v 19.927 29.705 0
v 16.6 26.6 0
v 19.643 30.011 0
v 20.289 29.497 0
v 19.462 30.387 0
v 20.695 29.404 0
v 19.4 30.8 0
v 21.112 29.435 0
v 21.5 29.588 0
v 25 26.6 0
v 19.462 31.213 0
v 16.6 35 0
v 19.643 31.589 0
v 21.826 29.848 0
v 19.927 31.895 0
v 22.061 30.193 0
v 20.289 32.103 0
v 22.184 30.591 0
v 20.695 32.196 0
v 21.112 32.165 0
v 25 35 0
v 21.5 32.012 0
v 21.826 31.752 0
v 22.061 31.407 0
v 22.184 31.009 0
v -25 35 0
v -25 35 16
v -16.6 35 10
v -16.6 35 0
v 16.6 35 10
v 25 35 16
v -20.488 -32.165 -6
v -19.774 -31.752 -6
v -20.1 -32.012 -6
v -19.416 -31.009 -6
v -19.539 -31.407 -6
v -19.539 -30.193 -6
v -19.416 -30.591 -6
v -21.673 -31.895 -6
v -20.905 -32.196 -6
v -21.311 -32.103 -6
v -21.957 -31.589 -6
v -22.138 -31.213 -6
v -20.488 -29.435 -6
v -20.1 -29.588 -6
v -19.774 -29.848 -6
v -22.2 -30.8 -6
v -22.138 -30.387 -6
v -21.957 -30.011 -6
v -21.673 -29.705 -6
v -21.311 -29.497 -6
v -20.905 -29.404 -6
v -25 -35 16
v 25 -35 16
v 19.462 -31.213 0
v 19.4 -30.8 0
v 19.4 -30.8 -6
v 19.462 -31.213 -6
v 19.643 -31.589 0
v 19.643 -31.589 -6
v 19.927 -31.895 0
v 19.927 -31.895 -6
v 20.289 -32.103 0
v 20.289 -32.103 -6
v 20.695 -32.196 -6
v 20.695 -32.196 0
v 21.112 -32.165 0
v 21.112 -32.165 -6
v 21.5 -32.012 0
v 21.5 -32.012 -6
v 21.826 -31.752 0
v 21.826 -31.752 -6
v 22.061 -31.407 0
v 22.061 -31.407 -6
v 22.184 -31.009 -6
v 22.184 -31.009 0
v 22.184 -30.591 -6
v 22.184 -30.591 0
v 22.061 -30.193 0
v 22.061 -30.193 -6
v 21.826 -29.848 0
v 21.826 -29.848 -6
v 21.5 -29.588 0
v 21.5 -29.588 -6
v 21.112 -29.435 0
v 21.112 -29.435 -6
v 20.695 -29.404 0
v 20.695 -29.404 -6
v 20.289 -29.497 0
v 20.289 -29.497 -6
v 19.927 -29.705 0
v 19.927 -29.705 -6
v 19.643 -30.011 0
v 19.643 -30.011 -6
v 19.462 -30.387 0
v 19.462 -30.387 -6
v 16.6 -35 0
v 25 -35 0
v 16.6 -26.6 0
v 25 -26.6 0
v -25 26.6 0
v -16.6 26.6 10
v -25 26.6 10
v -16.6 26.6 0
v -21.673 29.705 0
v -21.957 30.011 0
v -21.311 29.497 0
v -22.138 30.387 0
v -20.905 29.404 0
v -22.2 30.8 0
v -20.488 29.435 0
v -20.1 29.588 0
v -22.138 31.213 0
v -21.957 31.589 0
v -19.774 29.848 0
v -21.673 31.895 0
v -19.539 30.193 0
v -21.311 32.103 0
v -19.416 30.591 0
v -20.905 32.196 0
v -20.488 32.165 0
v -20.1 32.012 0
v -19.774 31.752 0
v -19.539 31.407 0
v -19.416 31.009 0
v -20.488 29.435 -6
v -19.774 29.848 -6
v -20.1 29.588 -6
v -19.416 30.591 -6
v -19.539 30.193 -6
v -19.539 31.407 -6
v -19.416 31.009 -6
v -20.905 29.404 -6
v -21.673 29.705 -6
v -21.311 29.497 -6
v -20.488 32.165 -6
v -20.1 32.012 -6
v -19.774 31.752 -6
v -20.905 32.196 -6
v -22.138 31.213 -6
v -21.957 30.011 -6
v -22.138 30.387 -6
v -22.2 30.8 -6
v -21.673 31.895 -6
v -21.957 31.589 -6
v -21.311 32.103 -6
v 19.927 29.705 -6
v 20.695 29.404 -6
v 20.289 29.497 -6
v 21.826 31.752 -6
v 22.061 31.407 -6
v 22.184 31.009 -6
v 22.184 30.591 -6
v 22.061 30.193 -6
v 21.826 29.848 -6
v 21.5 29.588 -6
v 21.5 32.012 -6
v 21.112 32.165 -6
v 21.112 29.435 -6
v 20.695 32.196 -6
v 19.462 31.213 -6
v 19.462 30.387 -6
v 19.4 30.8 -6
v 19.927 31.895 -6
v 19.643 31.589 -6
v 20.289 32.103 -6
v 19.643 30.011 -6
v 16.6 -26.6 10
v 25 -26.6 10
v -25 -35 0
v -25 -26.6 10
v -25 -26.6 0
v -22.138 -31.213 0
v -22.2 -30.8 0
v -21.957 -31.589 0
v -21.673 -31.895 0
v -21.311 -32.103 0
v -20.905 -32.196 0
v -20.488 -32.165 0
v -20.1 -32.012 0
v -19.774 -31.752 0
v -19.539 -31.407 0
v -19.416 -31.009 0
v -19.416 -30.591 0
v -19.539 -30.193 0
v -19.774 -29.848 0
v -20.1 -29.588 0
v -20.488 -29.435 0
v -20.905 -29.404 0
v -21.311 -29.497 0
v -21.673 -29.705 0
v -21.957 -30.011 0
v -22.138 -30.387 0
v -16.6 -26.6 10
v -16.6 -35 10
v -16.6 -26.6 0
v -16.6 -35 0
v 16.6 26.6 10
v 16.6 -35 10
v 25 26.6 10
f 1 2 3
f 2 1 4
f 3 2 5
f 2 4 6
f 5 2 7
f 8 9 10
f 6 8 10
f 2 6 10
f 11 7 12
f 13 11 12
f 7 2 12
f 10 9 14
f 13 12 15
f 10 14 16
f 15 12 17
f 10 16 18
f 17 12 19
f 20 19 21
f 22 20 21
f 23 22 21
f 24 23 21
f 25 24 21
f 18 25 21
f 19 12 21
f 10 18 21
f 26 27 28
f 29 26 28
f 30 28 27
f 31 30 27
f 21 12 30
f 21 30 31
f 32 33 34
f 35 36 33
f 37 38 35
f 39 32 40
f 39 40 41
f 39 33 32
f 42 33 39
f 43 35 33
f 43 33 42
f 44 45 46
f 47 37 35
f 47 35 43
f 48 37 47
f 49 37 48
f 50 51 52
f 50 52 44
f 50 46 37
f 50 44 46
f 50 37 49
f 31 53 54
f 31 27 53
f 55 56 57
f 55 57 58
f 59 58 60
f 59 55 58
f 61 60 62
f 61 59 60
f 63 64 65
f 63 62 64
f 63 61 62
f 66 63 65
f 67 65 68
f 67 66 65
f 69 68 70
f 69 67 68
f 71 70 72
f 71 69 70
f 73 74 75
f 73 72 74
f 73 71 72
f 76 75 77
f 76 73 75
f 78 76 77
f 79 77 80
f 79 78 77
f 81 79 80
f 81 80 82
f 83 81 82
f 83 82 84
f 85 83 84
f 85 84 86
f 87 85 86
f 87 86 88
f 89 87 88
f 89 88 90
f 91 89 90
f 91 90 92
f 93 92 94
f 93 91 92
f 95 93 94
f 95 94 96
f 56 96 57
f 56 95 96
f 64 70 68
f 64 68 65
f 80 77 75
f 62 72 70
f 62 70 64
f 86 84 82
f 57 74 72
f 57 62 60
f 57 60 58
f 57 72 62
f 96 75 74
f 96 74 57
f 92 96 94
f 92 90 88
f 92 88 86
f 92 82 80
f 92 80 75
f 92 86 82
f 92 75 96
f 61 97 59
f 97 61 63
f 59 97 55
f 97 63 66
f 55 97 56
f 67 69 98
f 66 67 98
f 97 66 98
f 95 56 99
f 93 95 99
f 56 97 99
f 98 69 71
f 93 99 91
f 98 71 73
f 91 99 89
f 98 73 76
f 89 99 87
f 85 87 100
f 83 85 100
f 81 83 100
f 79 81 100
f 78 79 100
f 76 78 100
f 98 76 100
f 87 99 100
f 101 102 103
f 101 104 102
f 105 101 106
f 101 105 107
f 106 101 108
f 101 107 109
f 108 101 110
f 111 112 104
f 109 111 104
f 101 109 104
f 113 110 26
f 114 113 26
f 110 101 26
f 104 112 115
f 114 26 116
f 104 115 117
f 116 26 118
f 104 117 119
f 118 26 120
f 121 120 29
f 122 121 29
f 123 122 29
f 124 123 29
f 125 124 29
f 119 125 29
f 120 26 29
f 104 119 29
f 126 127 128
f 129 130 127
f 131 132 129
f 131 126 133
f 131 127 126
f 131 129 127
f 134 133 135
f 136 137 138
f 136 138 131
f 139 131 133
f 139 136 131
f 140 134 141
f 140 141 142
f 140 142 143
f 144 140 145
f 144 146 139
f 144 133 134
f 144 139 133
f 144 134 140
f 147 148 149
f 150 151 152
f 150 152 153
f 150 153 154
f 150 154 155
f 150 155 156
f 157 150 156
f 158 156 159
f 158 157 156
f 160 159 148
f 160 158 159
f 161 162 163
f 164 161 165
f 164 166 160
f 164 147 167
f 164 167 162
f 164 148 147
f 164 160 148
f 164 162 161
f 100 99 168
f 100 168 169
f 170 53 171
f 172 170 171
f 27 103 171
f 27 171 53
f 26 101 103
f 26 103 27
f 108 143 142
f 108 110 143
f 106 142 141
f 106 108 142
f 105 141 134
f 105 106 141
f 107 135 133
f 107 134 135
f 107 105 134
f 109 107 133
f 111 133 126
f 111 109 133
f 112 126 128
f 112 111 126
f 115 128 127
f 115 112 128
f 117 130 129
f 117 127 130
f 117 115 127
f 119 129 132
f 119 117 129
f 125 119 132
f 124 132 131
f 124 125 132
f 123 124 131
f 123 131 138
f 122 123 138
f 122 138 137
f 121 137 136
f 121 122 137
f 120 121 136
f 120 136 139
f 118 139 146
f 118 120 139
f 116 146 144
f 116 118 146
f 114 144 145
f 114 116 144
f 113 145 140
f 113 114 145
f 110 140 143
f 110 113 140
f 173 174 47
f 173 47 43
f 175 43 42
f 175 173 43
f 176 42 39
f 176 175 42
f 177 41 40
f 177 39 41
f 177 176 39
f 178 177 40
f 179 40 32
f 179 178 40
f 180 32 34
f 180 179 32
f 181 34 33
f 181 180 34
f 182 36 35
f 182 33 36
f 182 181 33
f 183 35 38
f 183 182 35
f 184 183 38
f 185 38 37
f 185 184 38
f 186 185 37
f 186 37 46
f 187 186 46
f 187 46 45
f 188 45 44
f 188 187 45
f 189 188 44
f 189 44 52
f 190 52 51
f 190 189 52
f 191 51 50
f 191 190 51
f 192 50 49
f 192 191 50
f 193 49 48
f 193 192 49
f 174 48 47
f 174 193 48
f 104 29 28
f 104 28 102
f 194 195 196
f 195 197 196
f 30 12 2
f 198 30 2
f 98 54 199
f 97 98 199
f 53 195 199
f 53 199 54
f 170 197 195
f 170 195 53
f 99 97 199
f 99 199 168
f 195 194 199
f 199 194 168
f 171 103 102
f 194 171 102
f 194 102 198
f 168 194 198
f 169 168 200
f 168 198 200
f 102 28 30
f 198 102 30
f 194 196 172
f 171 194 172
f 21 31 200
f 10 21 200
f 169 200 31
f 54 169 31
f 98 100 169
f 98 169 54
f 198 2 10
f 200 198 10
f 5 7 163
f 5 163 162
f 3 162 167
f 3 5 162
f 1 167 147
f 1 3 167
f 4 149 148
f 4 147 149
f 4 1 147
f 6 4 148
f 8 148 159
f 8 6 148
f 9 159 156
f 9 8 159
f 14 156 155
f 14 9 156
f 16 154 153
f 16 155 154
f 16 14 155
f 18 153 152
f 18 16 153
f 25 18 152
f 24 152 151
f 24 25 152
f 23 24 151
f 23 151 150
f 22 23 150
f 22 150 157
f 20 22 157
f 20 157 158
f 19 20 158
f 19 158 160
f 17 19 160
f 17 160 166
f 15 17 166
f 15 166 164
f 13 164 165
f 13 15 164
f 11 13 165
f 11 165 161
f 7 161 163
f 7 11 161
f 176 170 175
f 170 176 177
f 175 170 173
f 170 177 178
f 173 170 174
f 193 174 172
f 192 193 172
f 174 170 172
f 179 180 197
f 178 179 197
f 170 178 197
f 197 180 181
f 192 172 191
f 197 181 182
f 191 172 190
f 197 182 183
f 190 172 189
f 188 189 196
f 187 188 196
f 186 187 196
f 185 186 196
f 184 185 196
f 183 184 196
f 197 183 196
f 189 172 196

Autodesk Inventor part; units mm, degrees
ref_plane "YZ Plane" through (0, 0, 0) normal (1, 0, 0) x (0, 1, 0)
ref_plane "XZ Plane" through (0, 0, 0) normal (0, 1, 0) x (-1, 0, 0)
ref_plane "XY Plane" through (0, 0, 0) normal (0, 0, 1) x (1, 0, 0)
sketch "스케치1" plane through (0, 0, 0) normal (0, 0, 1) x (1, 0, 0)
  circle A0 centre (20.8, -30.8) radius 1.6 projected
  circle A1 centre (20.8, 30.8) radius 1.6 projected
  circle A2 centre (-20.8, -30.8) radius 1.6 projected
  circle A3 centre (-20.8, 30.8) radius 1.6 projected
  line L0 (25, 35) -> (25, -35) projected
  line L1 (-25, 35) -> (25, 35) projected
  line L2 (-25, -35) -> (-25, 35) projected
  line L3 (25, -35) -> (-25, -35) projected
  line L4 (3.4609, -14.6309) -> (3.4609, -15.4416) projected
  line L5 (3.4609, -15.4416) -> (-1.9174, -15.4416) projected
  line L6 (-1.9174, -15.4416) -> (-1.9174, -17.4882) projected
  line L7 (-1.9174, -17.4882) -> (-2.6391, -17.4882) projected
  line L8 (-2.6391, -17.4882) -> (-2.6391, -12.5844) projected
  line L9 (-2.6391, -12.5844) -> (-1.9174, -12.5844) projected
  line L10 (-1.9174, -12.5844) -> (-1.9174, -14.6309) projected
  line L11 (-1.9174, -14.6309) -> (3.4609, -14.6309) projected
  spline S0 degree 3 poles (3.5894, -6.7069) (3.5894, -7.2061) (3.5079, -7.4974) (3.4054, -7.7829) (3.3472, -7.9038) (3.2038, -8.1322) (3.1203, -8.2371) (3.0259, -8.3332) knots 0 0 0 0 0.149781 0.149781 0.269685 0.269685 0.389491 0.389491 0.389491 0.389491 projected
  spline S1 degree 3 poles (3.0259, -8.3332) (2.8735, -8.4928) (2.696, -8.6163) (2.4131, -8.7398) (2.2257, -8.8143) (1.6618, -8.9024) (1.4109, -8.9165) (1.1672, -8.9165) knots 0 0 0 0 0.066182 0.066182 0.092608 0.092608 0.112316 0.112316 0.112316 0.112316 projected
  line L12 (1.1672, -8.9165) -> (-2.6391, -8.9165) projected
  line L13 (-2.6391, -8.9165) -> (-2.6391, -8.1058) projected
  line L14 (-2.6391, -8.1058) -> (1.187, -8.1058) projected
  spline S2 degree 3 poles (1.187, -8.1058) (1.576, -8.1058) (1.7854, -8.0698) (2.0673, -8.0159) (2.2402, -7.948) (2.3981, -7.8438) knots 0 0 0 0 0.116713 0.116713 0.342312 0.342312 0.342312 0.342312 projected
  spline S3 degree 3 poles (2.3981, -7.8438) (2.5057, -7.7728) (2.5951, -7.6834) (2.7648, -7.4325) (2.8129, -7.284) (2.8802, -7.0309) (2.8973, -6.8687) (2.8973, -6.7069) knots 0 0 0 0 0.038677 0.038677 0.09087 0.09087 0.175293 0.175293 0.175293 0.175293 projected
  spline S4 degree 3 poles (2.8973, -6.7069) (2.8973, -6.4866) (2.8694, -6.2573) (2.7554, -5.9796) (2.7065, -5.8804) (2.5606, -5.7003) (2.4845, -5.6319) (2.3981, -5.5749) knots 0 0 0 0 0.066079 0.066079 0.089916 0.089916 0.109159 0.109159 0.109159 0.109159 projected
  spline S5 degree 3 poles (2.3981, -5.5749) (2.2456, -5.4743) (2.0787, -5.4078) (1.787, -5.3484) (1.5677, -5.3129) (1.1672, -5.3129) knots 0 0 0 0 0.054791 0.054791 0.089305 0.089305 0.089305 0.089305 projected
  line L15 (1.1672, -5.3129) -> (-2.6391, -5.3129) projected
  line L16 (-2.6391, -5.3129) -> (-2.6391, -4.5022) projected
  line L17 (-2.6391, -4.5022) -> (1.1672, -4.5022) projected
  spline S6 degree 3 poles (1.1672, -4.5022) (1.7467, -4.5022) (2.0771, -4.578) (2.4094, -4.6758) (2.5476, -4.7346) (2.8054, -4.8878) (2.9214, -4.9794) (3.0259, -5.0855) knots 0 0 0 0 0.173857 0.173857 0.308173 0.308173 0.440658 0.440658 0.440658 0.440658 projected
  spline S7 degree 3 poles (3.0259, -5.0855) (3.188, -5.2476) (3.3119, -5.4359) (3.468, -5.8026) (3.513, -5.9645) (3.576, -6.3201) (3.5894, -6.5148) (3.5894, -6.7069) knots 0 0 0 0 0.068773 0.068773 0.119566 0.119566 0.177287 0.177287 0.177287 0.177287 projected
  line L18 (3.4609, 6.6696) -> (2.838, 6.6696) projected
  line L19 (2.838, 6.6696) -> (2.838, 7.4457) projected
  line L20 (2.838, 7.4457) -> (-2.0163, 7.4457) projected
  line L21 (-2.0163, 7.4457) -> (-2.0163, 6.6696) projected
  line L22 (-2.0163, 6.6696) -> (-2.6391, 6.6696) projected
  line L23 (-2.6391, 6.6696) -> (-2.6391, 9.0325) projected
  line L24 (-2.6391, 9.0325) -> (-2.0163, 9.0325) projected
  line L25 (-2.0163, 9.0325) -> (-2.0163, 8.2564) projected
  line L26 (-2.0163, 8.2564) -> (2.838, 8.2564) projected
  line L27 (2.838, 8.2564) -> (2.838, 9.0325) projected
  line L28 (2.838, 9.0325) -> (3.4609, 9.0325) projected
  line L29 (3.4609, 9.0325) -> (3.4609, 6.6696) projected
  spline S8 degree 3 poles (3.5696, 11.4498) (3.5696, 11.0968) (3.5385, 10.9252) (3.4927, 10.6907) (3.4451, 10.5225) (3.3917, 10.3623) knots 0 0 0 0 0.105897 0.105897 0.361981 0.361981 0.361981 0.361981 projected
  spline S9 degree 3 poles (3.3917, 10.3623) (3.3122, 10.1089) (3.2476, 9.9765) (3.1649, 9.8065) (3.1044, 9.6784) (3.0456, 9.5516) knots 0 0 0 0 0.079656 0.079656 0.305782 0.305782 0.305782 0.305782 projected
  line L30 (3.0456, 9.5516) -> (2.0767, 9.5516) projected
  line L31 (2.0767, 9.5516) -> (2.0767, 9.6109) projected
  spline S10 degree 3 poles (2.0767, 9.6109) (2.1724, 9.7066) (2.276, 9.8355) (2.4013, 9.9909) (2.4887, 10.1245) (2.5661, 10.2584) knots 0 0 0 0 0.0406 0.0406 0.180817 0.180817 0.180817 0.180817 projected
  spline S11 degree 3 poles (2.5661, 10.2584) (2.6936, 10.4889) (2.7578, 10.7089) (2.8422, 11.001) (2.8677, 11.2201) (2.8677, 11.4399) knots 0 0 0 0 0.079015 0.079015 0.285121 0.285121 0.285121 0.285121 projected
  spline S12 degree 3 poles (2.8677, 11.4399) (2.8677, 11.6791) (2.8234, 11.9096) (2.6905, 12.2276) (2.6304, 12.347) (2.4562, 12.5833) (2.363, 12.6815) (2.2596, 12.7696) knots 0 0 0 0 0.071758 0.071758 0.103413 0.103413 0.130661 0.130661 0.130661 0.130661 projected
  spline S13 degree 3 poles (2.2596, 12.7696) (2.0598, 12.9378) (1.8287, 13.0612) (1.3654, 13.2321) (1.0093, 13.3332) (0.4158, 13.3332) knots 0 0 0 0 0.078349 0.078349 0.148171 0.148171 0.148171 0.148171 projected
  spline S14 degree 3 poles (0.4158, 13.3332) (-0.1058, 13.3332) (-0.4504, 13.2487) (-0.927, 13.104) (-1.2002, 12.9774) (-1.428, 12.7894) knots 0 0 0 0 0.156476 0.156476 0.384161 0.384161 0.384161 0.384161 projected
  spline S15 degree 3 poles (-1.428, 12.7894) (-1.6106, 12.6333) (-1.7595, 12.4499) (-1.9192, 12.1338) (-1.9723, 12.0047) (-2.0407, 11.7153) (-2.0558, 11.5784) (-2.0558, 11.4399) knots 0 0 0 0 0.072073 0.072073 0.106242 0.106242 0.13604 0.13604 0.13604 0.13604 projected
  spline S16 degree 3 poles (-2.0558, 11.4399) (-2.0558, 11.0983) (-1.9995, 10.8945) (-1.922, 10.6336) (-1.853, 10.4636) (-1.7642, 10.3029) knots 0 0 0 0 0.102473 0.102473 0.315019 0.315019 0.315019 0.315019 projected
  spline S17 degree 3 poles (-1.7642, 10.3029) (-1.6346, 10.0678) (-1.5778, 9.9965) (-1.419, 9.8036) (-1.3331, 9.7017) (-1.255, 9.6158) knots 0 0 0 0 0.080527 0.080527 0.149615 0.149615 0.149615 0.149615 projected
  line L32 (-1.255, 9.6158) -> (-1.255, 9.5516) projected
  line L33 (-1.255, 9.5516) -> (-2.2338, 9.5516) projected
  spline S18 degree 3 poles (-2.2338, 9.5516) (-2.3342, 9.7386) (-2.4001, 9.8833) (-2.4926, 10.0908) (-2.5452, 10.2254) (-2.5897, 10.3623) knots 0 0 0 0 0.063697 0.063697 0.17369 0.17369 0.17369 0.17369 projected
  spline S19 degree 3 poles (-2.5897, 10.3623) (-2.6578, 10.586) (-2.6908, 10.783) (-2.7347, 11.0489) (-2.7479, 11.2426) (-2.7479, 11.4349) knots 0 0 0 0 0.070178 0.070178 0.245229 0.245229 0.245229 0.245229 projected
  spline S20 degree 3 poles (-2.7479, 11.4349) (-2.7479, 11.8102) (-2.6884, 12.1794) (-2.4851, 12.6671) (-2.4001, 12.8345) (-2.1695, 13.1574) (-2.0458, 13.2939) (-1.9075, 13.4172) knots 0 0 0 0 0.112583 0.112583 0.158498 0.158498 0.198702 0.198702 0.198702 0.198702 projected
  spline S21 degree 3 poles (-1.9075, 13.4172) (-1.6331, 13.6594) (-1.3194, 13.8381) (-0.7236, 14.0548) (-0.2884, 14.1785) (0.4158, 14.1785) knots 0 0 0 0 0.109811 0.109811 0.190197 0.190197 0.190197 0.190197 projected
  spline S22 degree 3 poles (0.4158, 14.1785) (1.1016, 14.1785) (1.5387, 14.0598) (1.9684, 13.9147) (2.1514, 13.8354) (2.4841, 13.645) (2.6333, 13.5376) (2.7688, 13.4123) knots 0 0 0 0 0.205724 0.205724 0.366116 0.366116 0.515054 0.515054 0.515054 0.515054 projected
  spline S23 degree 3 poles (2.7688, 13.4123) (3.001, 13.2001) (3.1844, 12.9521) (3.4019, 12.4833) (3.465, 12.2871) (3.55, 11.8776) (3.5696, 11.6642) (3.5696, 11.4498) knots 0 0 0 0 0.094355 0.094355 0.155041 0.155041 0.218881 0.218881 0.218881 0.218881 projected
  line L34 (3.4609, 0.9453) -> (0.8063, 3.1154) projected
  spline S24 degree 3 poles (0.8063, 3.1154) (0.7091, 2.8546) (0.5712, 2.6157) (0.2499, 2.2703) (0.0734, 2.1207) (-0.2854, 1.9573) (-0.4142, 1.9172) (-0.6904, 1.8622) (-0.8369, 1.8499) (-0.9831, 1.8499) knots 0 0 0 0 0.083518 0.083518 0.141507 0.141507 0.171807 0.171807 0.204564 0.204564 0.204564 0.204564 projected
  spline S25 degree 3 poles (-0.9831, 1.8499) (-1.2, 1.8499) (-1.421, 1.8784) (-1.7689, 2.0145) (-1.898, 2.0959) (-2.134, 2.2962) (-2.234, 2.4122) (-2.3178, 2.542) knots 0 0 0 0 0.065064 0.065064 0.111971 0.111971 0.158744 0.158744 0.158744 0.158744 projected
  spline S26 degree 3 poles (-2.3178, 2.542) (-2.4457, 2.7399) (-2.5352, 2.9539) (-2.6309, 3.4845) (-2.6391, 3.7907) (-2.6391, 4.0942) knots 0 0 0 0 0.070674 0.070674 0.161725 0.161725 0.161725 0.161725 projected
  line L35 (-2.6391, 4.0942) -> (-2.6391, 5.6661) projected
  line L36 (-2.6391, 5.6661) -> (3.4609, 5.6661) projected
  line L37 (3.4609, 5.6661) -> (3.4609, 4.8554) projected
  line L38 (3.4609, 4.8554) -> (1.0337, 4.8554) projected
  line L39 (1.0337, 4.8554) -> (1.0337, 3.9261) projected
  line L40 (1.0337, 3.9261) -> (3.4609, 1.9982) projected
  line L41 (3.4609, 1.9982) -> (3.4609, 0.9453) projected
  spline S27 degree 3 poles (3.5696, -1.9218) (3.5696, -2.2748) (3.5385, -2.4464) (3.4927, -2.6809) (3.4451, -2.849) (3.3917, -3.0093) knots 0 0 0 0 0.105897 0.105897 0.361981 0.361981 0.361981 0.361981 projected
  spline S28 degree 3 poles (3.3917, -3.0093) (3.3122, -3.2627) (3.2476, -3.3951) (3.1649, -3.5651) (3.1044, -3.6932) (3.0456, -3.82) knots 0 0 0 0 0.079656 0.079656 0.305782 0.305782 0.305782 0.305782 projected
  line L42 (3.0456, -3.82) -> (2.0767, -3.82) projected
  line L43 (2.0767, -3.82) -> (2.0767, -3.7607) projected
  spline S29 degree 3 poles (2.0767, -3.7607) (2.1724, -3.665) (2.276, -3.5361) (2.4013, -3.3806) (2.4887, -3.2471) (2.5661, -3.1131) knots 0 0 0 0 0.0406 0.0406 0.180817 0.180817 0.180817 0.180817 projected
  spline S30 degree 3 poles (2.5661, -3.1131) (2.6936, -2.8826) (2.7578, -2.6627) (2.8422, -2.3706) (2.8677, -2.1514) (2.8677, -1.9317) knots 0 0 0 0 0.079015 0.079015 0.285121 0.285121 0.285121 0.285121 projected
  spline S31 degree 3 poles (2.8677, -1.9317) (2.8677, -1.6925) (2.8234, -1.462) (2.6905, -1.144) (2.6304, -1.0246) (2.4562, -0.7882) (2.363, -0.6901) (2.2596, -0.6019) knots 0 0 0 0 0.071758 0.071758 0.103413 0.103413 0.130661 0.130661 0.130661 0.130661 projected
  spline S32 degree 3 poles (2.2596, -0.6019) (2.0598, -0.4338) (1.8287, -0.3103) (1.3654, -0.1394) (1.0093, -0.0384) (0.4158, -0.0384) knots 0 0 0 0 0.078349 0.078349 0.148171 0.148171 0.148171 0.148171 projected
  spline S33 degree 3 poles (0.4158, -0.0384) (-0.1058, -0.0384) (-0.4504, -0.1228) (-0.927, -0.2675) (-1.2002, -0.3941) (-1.428, -0.5822) knots 0 0 0 0 0.156476 0.156476 0.384161 0.384161 0.384161 0.384161 projected
  spline S34 degree 3 poles (-1.428, -0.5822) (-1.6106, -0.7383) (-1.7595, -0.9217) (-1.9192, -1.2377) (-1.9723, -1.3669) (-2.0407, -1.6563) (-2.0558, -1.7931) (-2.0558, -1.9317) knots 0 0 0 0 0.072073 0.072073 0.106242 0.106242 0.13604 0.13604 0.13604 0.13604 projected
  spline S35 degree 3 poles (-2.0558, -1.9317) (-2.0558, -2.2732) (-1.9995, -2.4771) (-1.922, -2.7379) (-1.853, -2.908) (-1.7642, -3.0686) knots 0 0 0 0 0.102473 0.102473 0.315019 0.315019 0.315019 0.315019 projected
  spline S36 degree 3 poles (-1.7642, -3.0686) (-1.6346, -3.3037) (-1.5778, -3.3751) (-1.419, -3.568) (-1.3331, -3.6699) (-1.255, -3.7557) knots 0 0 0 0 0.080527 0.080527 0.149615 0.149615 0.149615 0.149615 projected
  line L44 (-1.255, -3.7557) -> (-1.255, -3.82) projected
  line L45 (-1.255, -3.82) -> (-2.2338, -3.82) projected
  spline S37 degree 3 poles (-2.2338, -3.82) (-2.3342, -3.6329) (-2.4001, -3.4883) (-2.4926, -3.2807) (-2.5452, -3.1462) (-2.5897, -3.0093) knots 0 0 0 0 0.063697 0.063697 0.17369 0.17369 0.17369 0.17369 projected
  spline S38 degree 3 poles (-2.5897, -3.0093) (-2.6578, -2.7855) (-2.6908, -2.5886) (-2.7347, -2.3227) (-2.7479, -2.129) (-2.7479, -1.9366) knots 0 0 0 0 0.070178 0.070178 0.245229 0.245229 0.245229 0.245229 projected
  spline S39 degree 3 poles (-2.7479, -1.9366) (-2.7479, -1.5613) (-2.6884, -1.1922) (-2.4851, -0.7045) (-2.4001, -0.5371) (-2.1695, -0.2142) (-2.0458, -0.0776) (-1.9075, 0.0456) knots 0 0 0 0 0.112583 0.112583 0.158498 0.158498 0.198702 0.198702 0.198702 0.198702 projected
  spline S40 degree 3 poles (-1.9075, 0.0456) (-1.6331, 0.2878) (-1.3194, 0.4666) (-0.7236, 0.6832) (-0.2884, 0.8069) (0.4158, 0.8069) knots 0 0 0 0 0.109811 0.109811 0.190197 0.190197 0.190197 0.190197 projected
  spline S41 degree 3 poles (0.4158, 0.8069) (1.1016, 0.8069) (1.5387, 0.6882) (1.9684, 0.5432) (2.1514, 0.4638) (2.4841, 0.2734) (2.6333, 0.166) (2.7688, 0.0407) knots 0 0 0 0 0.205724 0.205724 0.366116 0.366116 0.515054 0.515054 0.515054 0.515054 projected
  spline S42 degree 3 poles (2.7688, 0.0407) (3.001, -0.1714) (3.1844, -0.4194) (3.4019, -0.8882) (3.465, -1.0845) (3.55, -1.494) (3.5696, -1.7074) (3.5696, -1.9218) knots 0 0 0 0 0.094355 0.094355 0.155041 0.155041 0.218881 0.218881 0.218881 0.218881 projected
  line L46 (3.4609, -12.2038) -> (2.838, -12.2038) projected
  line L47 (2.838, -12.2038) -> (2.838, -11.4277) projected
  line L48 (2.838, -11.4277) -> (-2.0163, -11.4277) projected
  line L49 (-2.0163, -11.4277) -> (-2.0163, -12.2038) projected
  line L50 (-2.0163, -12.2038) -> (-2.6391, -12.2038) projected
  line L51 (-2.6391, -12.2038) -> (-2.6391, -9.8409) projected
  line L52 (-2.6391, -9.8409) -> (-2.0163, -9.8409) projected
  line L53 (-2.0163, -9.8409) -> (-2.0163, -10.617) projected
  line L54 (-2.0163, -10.617) -> (2.838, -10.617) projected
  line L55 (2.838, -10.617) -> (2.838, -9.8409) projected
  line L56 (2.838, -9.8409) -> (3.4609, -9.8409) projected
  line L57 (3.4609, -9.8409) -> (3.4609, -12.2038) projected
  line L58 (-25, -35) -> (25, -35)
  line L59 (25, -35) -> (25, 35)
  line L60 (25, 35) -> (-25, 35)
  line L61 (-25, 35) -> (-25, -35)
  circle A4 centre (-20.8, 30.8) radius 4.2
  circle A5 centre (-20.8, -30.8) radius 4.2
  circle A6 centre (20.8, -30.8) radius 4.2
  circle A7 centre (20.8, 30.8) radius 4.2
  line L62 (-16.6, 26.6) -> (-25, 26.6)
  line L63 (-25, 26.6) -> (-25, 35)
  line L64 (-25, 35) -> (-16.6, 35)
  line L65 (-16.6, 35) -> (-16.6, 26.6)
  line L66 (-16.6, -26.6) -> (-25, -26.6)
  line L67 (-25, -26.6) -> (-25, -35)
  line L68 (-25, -35) -> (-16.6, -35)
  line L69 (-16.6, -35) -> (-16.6, -26.6)
  line L70 (16.6, -26.6) -> (25, -26.6)
  line L71 (25, -26.6) -> (25, -35)
  line L72 (25, -35) -> (16.6, -35)
  line L73 (16.6, -35) -> (16.6, -26.6)
  line L74 (16.6, 26.6) -> (25, 26.6)
  line L75 (25, 26.6) -> (25, 35)
  line L76 (25, 35) -> (16.6, 35)
  line L77 (16.6, 35) -> (16.6, 26.6)
  point P0 (0, 0)
  point P1 (-16.6, -30.8)
  point P2 (-20.8, -35)
  point P3 (-20.8, -26.6)
  point P4 (-25, -30.8)
  point P5 (16.6, -30.8)
  point P6 (20.8, -35)
  point P7 (20.8, -26.6)
  point P8 (25, -30.8)
  point P9 (-16.6, 30.8)
  point P10 (-20.8, 35)
  point P11 (-20.8, 26.6)
  point P12 (-25, 30.8)
  point P13 (16.6, 30.8)
  point P14 (20.8, 35)
  point P15 (20.8, 26.6)
  point P16 (25, 30.8)
extrude "돌출1" add sketch "스케치1" along normal blind 10 contours A0 | A1 | A2 | A3 | L0 A7 L1 | A7 | L0 L74 A7 | A7 L77 L1 | L74 L77 A7 | L0 A6 L70 | L65 A4 L1 | A6 | L0 L3 A6 | A6 L73 L70 | A4 L2 L1 | A4 | L65 L62 A4 | L3 L73 A6 | A4 L62 L2 | L3 A5 L69 | L66 A5 L2 | L3 L2 A5 | A5 | A5 L66 L69
sketch "스케치2" plane through (-20.8, -30.8, 10) normal (0, 0, 1) x (1, 0, 0)
  circle A0 centre (41.6, 0) radius 1.6 projected
  circle A1 centre (41.6, 61.6) radius 1.6 projected
  circle A2 centre (0, 0) radius 1.6 projected
  circle A3 centre (0, 61.6) radius 1.6 projected
  line L0 (45.8, 65.8) -> (45.8, -4.2) projected
  line L1 (-4.2, 65.8) -> (45.8, 65.8) projected
  line L2 (-4.2, -4.2) -> (-4.2, 65.8) projected
  line L3 (45.8, -4.2) -> (-4.2, -4.2) projected
  line L4 (24.2609, 16.1691) -> (24.2609, 15.3584) projected
  line L5 (24.2609, 15.3584) -> (18.8826, 15.3584) projected
  line L6 (18.8826, 15.3584) -> (18.8826, 13.3118) projected
  line L7 (18.8826, 13.3118) -> (18.1609, 13.3118) projected
  line L8 (18.1609, 13.3118) -> (18.1609, 18.2156) projected
  line L9 (18.1609, 18.2156) -> (18.8826, 18.2156) projected
  line L10 (18.8826, 18.2156) -> (18.8826, 16.1691) projected
  line L11 (18.8826, 16.1691) -> (24.2609, 16.1691) projected
  spline S0 degree 3 poles (24.3894, 24.0931) (24.3894, 23.5939) (24.3079, 23.3026) (24.2054, 23.0171) (24.1472, 22.8962) (24.0038, 22.6678) (23.9203, 22.5629) (23.8259, 22.4668) knots 0 0 0 0 0.149781 0.149781 0.269685 0.269685 0.389491 0.389491 0.389491 0.389491 projected
  spline S1 degree 3 poles (23.8259, 22.4668) (23.6735, 22.3072) (23.496, 22.1837) (23.2131, 22.0602) (23.0257, 21.9857) (22.4618, 21.8976) (22.2109, 21.8835) (21.9672, 21.8835) knots 0 0 0 0 0.066182 0.066182 0.092608 0.092608 0.112316 0.112316 0.112316 0.112316 projected
  line L12 (21.9672, 21.8835) -> (18.1609, 21.8835) projected
  line L13 (18.1609, 21.8835) -> (18.1609, 22.6942) projected
  line L14 (18.1609, 22.6942) -> (21.987, 22.6942) projected
  spline S2 degree 3 poles (21.987, 22.6942) (22.376, 22.6942) (22.5854, 22.7302) (22.8673, 22.7841) (23.0402, 22.852) (23.1981, 22.9562) knots 0 0 0 0 0.116713 0.116713 0.342312 0.342312 0.342312 0.342312 projected
  spline S3 degree 3 poles (23.1981, 22.9562) (23.3057, 23.0272) (23.3951, 23.1166) (23.5648, 23.3675) (23.6129, 23.516) (23.6802, 23.7691) (23.6973, 23.9313) (23.6973, 24.0931) knots 0 0 0 0 0.038677 0.038677 0.09087 0.09087 0.175293 0.175293 0.175293 0.175293 projected
  spline S4 degree 3 poles (23.6973, 24.0931) (23.6973, 24.3134) (23.6694, 24.5427) (23.5554, 24.8204) (23.5065, 24.9196) (23.3606, 25.0997) (23.2845, 25.1681) (23.1981, 25.2251) knots 0 0 0 0 0.066079 0.066079 0.089916 0.089916 0.109159 0.109159 0.109159 0.109159 projected
  spline S5 degree 3 poles (23.1981, 25.2251) (23.0456, 25.3257) (22.8787, 25.3922) (22.587, 25.4516) (22.3677, 25.4871) (21.9672, 25.4871) knots 0 0 0 0 0.054791 0.054791 0.089305 0.089305 0.089305 0.089305 projected
  line L15 (21.9672, 25.4871) -> (18.1609, 25.4871) projected
  line L16 (18.1609, 25.4871) -> (18.1609, 26.2978) projected
  line L17 (18.1609, 26.2978) -> (21.9672, 26.2978) projected
  spline S6 degree 3 poles (21.9672, 26.2978) (22.5467, 26.2978) (22.8771, 26.222) (23.2094, 26.1242) (23.3476, 26.0654) (23.6054, 25.9122) (23.7214, 25.8206) (23.8259, 25.7145) knots 0 0 0 0 0.173857 0.173857 0.308173 0.308173 0.440658 0.440658 0.440658 0.440658 projected
  spline S7 degree 3 poles (23.8259, 25.7145) (23.988, 25.5524) (24.1119, 25.3641) (24.268, 24.9974) (24.313, 24.8355) (24.376, 24.4799) (24.3894, 24.2852) (24.3894, 24.0931) knots 0 0 0 0 0.068773 0.068773 0.119566 0.119566 0.177287 0.177287 0.177287 0.177287 projected
  line L18 (24.2609, 37.4696) -> (23.638, 37.4696) projected
  line L19 (23.638, 37.4696) -> (23.638, 38.2457) projected
  line L20 (23.638, 38.2457) -> (18.7837, 38.2457) projected
  line L21 (18.7837, 38.2457) -> (18.7837, 37.4696) projected
  line L22 (18.7837, 37.4696) -> (18.1609, 37.4696) projected
  line L23 (18.1609, 37.4696) -> (18.1609, 39.8325) projected
  line L24 (18.1609, 39.8325) -> (18.7837, 39.8325) projected
  line L25 (18.7837, 39.8325) -> (18.7837, 39.0564) projected
  line L26 (18.7837, 39.0564) -> (23.638, 39.0564) projected
  line L27 (23.638, 39.0564) -> (23.638, 39.8325) projected
  line L28 (23.638, 39.8325) -> (24.2609, 39.8325) projected
  line L29 (24.2609, 39.8325) -> (24.2609, 37.4696) projected
  spline S8 degree 3 poles (24.3696, 42.2498) (24.3696, 41.8968) (24.3385, 41.7252) (24.2927, 41.4907) (24.2451, 41.3225) (24.1917, 41.1623) knots 0 0 0 0 0.105897 0.105897 0.361981 0.361981 0.361981 0.361981 projected
  spline S9 degree 3 poles (24.1917, 41.1623) (24.1122, 40.9089) (24.0476, 40.7765) (23.9649, 40.6065) (23.9044, 40.4784) (23.8456, 40.3516) knots 0 0 0 0 0.079656 0.079656 0.305782 0.305782 0.305782 0.305782 projected
  line L30 (23.8456, 40.3516) -> (22.8767, 40.3516) projected
  line L31 (22.8767, 40.3516) -> (22.8767, 40.4109) projected
  spline S10 degree 3 poles (22.8767, 40.4109) (22.9724, 40.5066) (23.076, 40.6355) (23.2013, 40.7909) (23.2887, 40.9245) (23.3661, 41.0584) knots 0 0 0 0 0.0406 0.0406 0.180817 0.180817 0.180817 0.180817 projected
  spline S11 degree 3 poles (23.3661, 41.0584) (23.4936, 41.2889) (23.5578, 41.5089) (23.6422, 41.801) (23.6677, 42.0201) (23.6677, 42.2399) knots 0 0 0 0 0.079015 0.079015 0.285121 0.285121 0.285121 0.285121 projected
  spline S12 degree 3 poles (23.6677, 42.2399) (23.6677, 42.4791) (23.6234, 42.7096) (23.4905, 43.0276) (23.4304, 43.147) (23.2562, 43.3833) (23.163, 43.4815) (23.0596, 43.5696) knots 0 0 0 0 0.071758 0.071758 0.103413 0.103413 0.130661 0.130661 0.130661 0.130661 projected
  spline S13 degree 3 poles (23.0596, 43.5696) (22.8598, 43.7378) (22.6287, 43.8612) (22.1654, 44.0321) (21.8093, 44.1332) (21.2158, 44.1332) knots 0 0 0 0 0.078349 0.078349 0.148171 0.148171 0.148171 0.148171 projected
  spline S14 degree 3 poles (21.2158, 44.1332) (20.6942, 44.1332) (20.3496, 44.0487) (19.873, 43.904) (19.5998, 43.7774) (19.372, 43.5894) knots 0 0 0 0 0.156476 0.156476 0.384161 0.384161 0.384161 0.384161 projected
  spline S15 degree 3 poles (19.372, 43.5894) (19.1894, 43.4333) (19.0405, 43.2499) (18.8808, 42.9338) (18.8277, 42.8047) (18.7593, 42.5153) (18.7442, 42.3784) (18.7442, 42.2399) knots 0 0 0 0 0.072073 0.072073 0.106242 0.106242 0.13604 0.13604 0.13604 0.13604 projected
  spline S16 degree 3 poles (18.7442, 42.2399) (18.7442, 41.8983) (18.8005, 41.6945) (18.878, 41.4336) (18.947, 41.2636) (19.0358, 41.1029) knots 0 0 0 0 0.102473 0.102473 0.315019 0.315019 0.315019 0.315019 projected
  spline S17 degree 3 poles (19.0358, 41.1029) (19.1654, 40.8678) (19.2222, 40.7965) (19.381, 40.6036) (19.4669, 40.5017) (19.545, 40.4158) knots 0 0 0 0 0.080527 0.080527 0.149615 0.149615 0.149615 0.149615 projected
  line L32 (19.545, 40.4158) -> (19.545, 40.3516) projected
  line L33 (19.545, 40.3516) -> (18.5662, 40.3516) projected
  spline S18 degree 3 poles (18.5662, 40.3516) (18.4658, 40.5386) (18.3999, 40.6833) (18.3074, 40.8908) (18.2548, 41.0254) (18.2103, 41.1623) knots 0 0 0 0 0.063697 0.063697 0.17369 0.17369 0.17369 0.17369 projected
  spline S19 degree 3 poles (18.2103, 41.1623) (18.1422, 41.386) (18.1092, 41.583) (18.0653, 41.8489) (18.0521, 42.0426) (18.0521, 42.2349) knots 0 0 0 0 0.070178 0.070178 0.245229 0.245229 0.245229 0.245229 projected
  spline S20 degree 3 poles (18.0521, 42.2349) (18.0521, 42.6102) (18.1116, 42.9794) (18.3149, 43.4671) (18.3999, 43.6345) (18.6305, 43.9574) (18.7542, 44.0939) (18.8925, 44.2172) knots 0 0 0 0 0.112583 0.112583 0.158498 0.158498 0.198702 0.198702 0.198702 0.198702 projected
  spline S21 degree 3 poles (18.8925, 44.2172) (19.1669, 44.4594) (19.4806, 44.6381) (20.0764, 44.8548) (20.5116, 44.9785) (21.2158, 44.9785) knots 0 0 0 0 0.109811 0.109811 0.190197 0.190197 0.190197 0.190197 projected
  spline S22 degree 3 poles (21.2158, 44.9785) (21.9016, 44.9785) (22.3387, 44.8598) (22.7684, 44.7147) (22.9514, 44.6354) (23.2841, 44.445) (23.4333, 44.3376) (23.5688, 44.2123) knots 0 0 0 0 0.205724 0.205724 0.366116 0.366116 0.515054 0.515054 0.515054 0.515054 projected
  spline S23 degree 3 poles (23.5688, 44.2123) (23.801, 44.0001) (23.9844, 43.7521) (24.2019, 43.2833) (24.265, 43.0871) (24.35, 42.6776) (24.3696, 42.4642) (24.3696, 42.2498) knots 0 0 0 0 0.094355 0.094355 0.155041 0.155041 0.218881 0.218881 0.218881 0.218881 projected
  line L34 (24.2609, 31.7453) -> (21.6063, 33.9154) projected
  spline S24 degree 3 poles (21.6063, 33.9154) (21.5091, 33.6546) (21.3712, 33.4157) (21.0499, 33.0703) (20.8734, 32.9207) (20.5146, 32.7573) (20.3858, 32.7172) (20.1096, 32.6622) (19.9631, 32.6499) (19.8169, 32.6499) knots 0 0 0 0 0.083518 0.083518 0.141507 0.141507 0.171807 0.171807 0.204564 0.204564 0.204564 0.204564 projected
  spline S25 degree 3 poles (19.8169, 32.6499) (19.6, 32.6499) (19.379, 32.6784) (19.0311, 32.8145) (18.902, 32.8959) (18.666, 33.0962) (18.566, 33.2122) (18.4822, 33.342) knots 0 0 0 0 0.065064 0.065064 0.111971 0.111971 0.158744 0.158744 0.158744 0.158744 projected
  spline S26 degree 3 poles (18.4822, 33.342) (18.3543, 33.5399) (18.2648, 33.7539) (18.1691, 34.2845) (18.1609, 34.5907) (18.1609, 34.8942) knots 0 0 0 0 0.070674 0.070674 0.161725 0.161725 0.161725 0.161725 projected
  line L35 (18.1609, 34.8942) -> (18.1609, 36.4661) projected
  line L36 (18.1609, 36.4661) -> (24.2609, 36.4661) projected
  line L37 (24.2609, 36.4661) -> (24.2609, 35.6554) projected
  line L38 (24.2609, 35.6554) -> (21.8337, 35.6554) projected
  line L39 (21.8337, 35.6554) -> (21.8337, 34.7261) projected
  line L40 (21.8337, 34.7261) -> (24.2609, 32.7982) projected
  line L41 (24.2609, 32.7982) -> (24.2609, 31.7453) projected
  spline S27 degree 3 poles (24.3696, 28.8782) (24.3696, 28.5252) (24.3385, 28.3536) (24.2927, 28.1191) (24.2451, 27.951) (24.1917, 27.7907) knots 0 0 0 0 0.105897 0.105897 0.361981 0.361981 0.361981 0.361981 projected
  spline S28 degree 3 poles (24.1917, 27.7907) (24.1122, 27.5373) (24.0476, 27.4049) (23.9649, 27.2349) (23.9044, 27.1068) (23.8456, 26.98) knots 0 0 0 0 0.079656 0.079656 0.305782 0.305782 0.305782 0.305782 projected
  line L42 (23.8456, 26.98) -> (22.8767, 26.98) projected
  line L43 (22.8767, 26.98) -> (22.8767, 27.0393) projected
  spline S29 degree 3 poles (22.8767, 27.0393) (22.9724, 27.135) (23.076, 27.2639) (23.2013, 27.4194) (23.2887, 27.5529) (23.3661, 27.6869) knots 0 0 0 0 0.0406 0.0406 0.180817 0.180817 0.180817 0.180817 projected
  spline S30 degree 3 poles (23.3661, 27.6869) (23.4936, 27.9174) (23.5578, 28.1373) (23.6422, 28.4294) (23.6677, 28.6486) (23.6677, 28.8683) knots 0 0 0 0 0.079015 0.079015 0.285121 0.285121 0.285121 0.285121 projected
  spline S31 degree 3 poles (23.6677, 28.8683) (23.6677, 29.1075) (23.6234, 29.338) (23.4905, 29.656) (23.4304, 29.7754) (23.2562, 30.0118) (23.163, 30.1099) (23.0596, 30.1981) knots 0 0 0 0 0.071758 0.071758 0.103413 0.103413 0.130661 0.130661 0.130661 0.130661 projected
  spline S32 degree 3 poles (23.0596, 30.1981) (22.8598, 30.3662) (22.6287, 30.4897) (22.1654, 30.6606) (21.8093, 30.7616) (21.2158, 30.7616) knots 0 0 0 0 0.078349 0.078349 0.148171 0.148171 0.148171 0.148171 projected
  spline S33 degree 3 poles (21.2158, 30.7616) (20.6942, 30.7616) (20.3496, 30.6772) (19.873, 30.5325) (19.5998, 30.4059) (19.372, 30.2178) knots 0 0 0 0 0.156476 0.156476 0.384161 0.384161 0.384161 0.384161 projected
  spline S34 degree 3 poles (19.372, 30.2178) (19.1894, 30.0617) (19.0405, 29.8783) (18.8808, 29.5623) (18.8277, 29.4331) (18.7593, 29.1437) (18.7442, 29.0069) (18.7442, 28.8683) knots 0 0 0 0 0.072073 0.072073 0.106242 0.106242 0.13604 0.13604 0.13604 0.13604 projected
  spline S35 degree 3 poles (18.7442, 28.8683) (18.7442, 28.5268) (18.8005, 28.3229) (18.878, 28.0621) (18.947, 27.892) (19.0358, 27.7314) knots 0 0 0 0 0.102473 0.102473 0.315019 0.315019 0.315019 0.315019 projected
  spline S36 degree 3 poles (19.0358, 27.7314) (19.1654, 27.4963) (19.2222, 27.4249) (19.381, 27.232) (19.4669, 27.1301) (19.545, 27.0443) knots 0 0 0 0 0.080527 0.080527 0.149615 0.149615 0.149615 0.149615 projected
  line L44 (19.545, 27.0443) -> (19.545, 26.98) projected
  line L45 (19.545, 26.98) -> (18.5662, 26.98) projected
  spline S37 degree 3 poles (18.5662, 26.98) (18.4658, 27.1671) (18.3999, 27.3117) (18.3074, 27.5193) (18.2548, 27.6538) (18.2103, 27.7907) knots 0 0 0 0 0.063697 0.063697 0.17369 0.17369 0.17369 0.17369 projected
  spline S38 degree 3 poles (18.2103, 27.7907) (18.1422, 28.0145) (18.1092, 28.2114) (18.0653, 28.4773) (18.0521, 28.671) (18.0521, 28.8634) knots 0 0 0 0 0.070178 0.070178 0.245229 0.245229 0.245229 0.245229 projected
  spline S39 degree 3 poles (18.0521, 28.8634) (18.0521, 29.2387) (18.1116, 29.6078) (18.3149, 30.0955) (18.3999, 30.2629) (18.6305, 30.5858) (18.7542, 30.7224) (18.8925, 30.8456) knots 0 0 0 0 0.112583 0.112583 0.158498 0.158498 0.198702 0.198702 0.198702 0.198702 projected
  spline S40 degree 3 poles (18.8925, 30.8456) (19.1669, 31.0878) (19.4806, 31.2666) (20.0764, 31.4832) (20.5116, 31.6069) (21.2158, 31.6069) knots 0 0 0 0 0.109811 0.109811 0.190197 0.190197 0.190197 0.190197 projected
  spline S41 degree 3 poles (21.2158, 31.6069) (21.9016, 31.6069) (22.3387, 31.4882) (22.7684, 31.3432) (22.9514, 31.2638) (23.2841, 31.0734) (23.4333, 30.966) (23.5688, 30.8407) knots 0 0 0 0 0.205724 0.205724 0.366116 0.366116 0.515054 0.515054 0.515054 0.515054 projected
  spline S42 degree 3 poles (23.5688, 30.8407) (23.801, 30.6286) (23.9844, 30.3806) (24.2019, 29.9118) (24.265, 29.7155) (24.35, 29.306) (24.3696, 29.0926) (24.3696, 28.8782) knots 0 0 0 0 0.094355 0.094355 0.155041 0.155041 0.218881 0.218881 0.218881 0.218881 projected
  line L46 (24.2609, 18.5962) -> (23.638, 18.5962) projected
  line L47 (23.638, 18.5962) -> (23.638, 19.3723) projected
  line L48 (23.638, 19.3723) -> (18.7837, 19.3723) projected
  line L49 (18.7837, 19.3723) -> (18.7837, 18.5962) projected
  line L50 (18.7837, 18.5962) -> (18.1609, 18.5962) projected
  line L51 (18.1609, 18.5962) -> (18.1609, 20.9591) projected
  line L52 (18.1609, 20.9591) -> (18.7837, 20.9591) projected
  line L53 (18.7837, 20.9591) -> (18.7837, 20.183) projected
  line L54 (18.7837, 20.183) -> (23.638, 20.183) projected
  line L55 (23.638, 20.183) -> (23.638, 20.9591) projected
  line L56 (23.638, 20.9591) -> (24.2609, 20.9591) projected
  line L57 (24.2609, 20.9591) -> (24.2609, 18.5962) projected
  point P0 (20.8, 30.8)
extrude "돌출2" add sketch "스케치2" along normal blind 6 contours A0 | A1 | A2 | A3 | L0 L3 L2 L1 | L4 L5 L6 L7 L8 L9 L10 L11 | S0 S1 L12 L13 L14 S2 S3 S4 S5 L15 L16 L17 S6 S7 | L18 L19 L20 L21 L22 L23 L24 L25 L26 L27 L28 L29 | S8 S9 L30 L31 S10 S11 S12 S13 S14 S15 S16 S17 L32 L33 S18 S19 S20 S21 S22 S23 | L34 S24 S25 S26 L35 L36 L37 L38 L39 L40 L41 | S27 S28 L42 L43 S29 S30 S31 S32 S33 S34 S35 S36 L44 L45 S37 S38 S39 S40 S41 S42 | L46 L47 L48 L49 L50 L51 L52 L53 L54 L55 L56 L57
sketch "스케치4" plane through (20.8, -30.8, 0) normal (0, 0, -1) x (-1, 0, 0)
  circle A0 centre (0, 0) radius 1.6 projected
  circle A1 centre (0, 61.6) radius 1.6 projected
  circle A2 centre (41.6, 0) radius 1.6 projected
  circle A3 centre (41.6, 61.6) radius 1.6 projected
  line L0 (-4.2, 65.8) -> (-4.2, -4.2) projected
  line L1 (-4.2, -4.2) -> (45.8, -4.2) projected
  line L2 (45.8, -4.2) -> (45.8, 65.8) projected
  line L3 (45.8, 65.8) -> (-4.2, 65.8) projected
  line L4 (17.3391, 15.3584) -> (17.3391, 16.1691) projected
  line L5 (17.3391, 16.1691) -> (22.7174, 16.1691) projected
  line L6 (22.7174, 16.1691) -> (22.7174, 18.2156) projected
  line L7 (22.7174, 18.2156) -> (23.4391, 18.2156) projected
  line L8 (23.4391, 18.2156) -> (23.4391, 13.3118) projected
  line L9 (23.4391, 13.3118) -> (22.7174, 13.3118) projected
  line L10 (22.7174, 13.3118) -> (22.7174, 15.3584) projected
  line L11 (22.7174, 15.3584) -> (17.3391, 15.3584) projected
  spline S0 degree 2 poles (17.7741, 22.4668) (17.4874, 22.7584) (17.2106, 23.5296) (17.2106, 24.0931) knots 0 0 0 1 2 2 2 projected
  spline S1 degree 2 poles (17.2106, 24.0931) (17.2106, 24.6319) (17.4924, 25.4328) (17.7741, 25.7145) knots 0 0 0 1 2 2 2 projected
  spline S2 degree 2 poles (17.7741, 25.7145) (18.0905, 26.0358) (18.9803, 26.2978) (19.6328, 26.2978) knots 0 0 0 1 2 2 2 projected
  line L12 (19.6328, 26.2978) -> (23.4391, 26.2978) projected
  line L13 (23.4391, 26.2978) -> (23.4391, 25.4871) projected
  line L14 (23.4391, 25.4871) -> (19.6328, 25.4871) projected
  spline S3 degree 2 poles (19.6328, 25.4871) (19.2077, 25.4871) (18.6343, 25.3784) (18.4019, 25.2251) knots 0 0 0 1 2 2 2 projected
  spline S4 degree 2 poles (18.4019, 25.2251) (18.1548, 25.062) (17.9027, 24.4985) (17.9027, 24.0931) knots 0 0 0 1 2 2 2 projected
  spline S5 degree 2 poles (17.9027, 24.0931) (17.9027, 23.7125) (18.1548, 23.1193) (18.4019, 22.9562) knots 0 0 0 1 2 2 2 projected
  spline S6 degree 2 poles (18.4019, 22.9562) (18.6343, 22.8029) (19.2028, 22.6942) (19.613, 22.6942) knots 0 0 0 1 2 2 2 projected
  line L15 (19.613, 22.6942) -> (23.4391, 22.6942) projected
  line L16 (23.4391, 22.6942) -> (23.4391, 21.8835) projected
  line L17 (23.4391, 21.8835) -> (19.6328, 21.8835) projected
  spline S7 degree 2 poles (19.6328, 21.8835) (18.9951, 21.8835) (18.0856, 22.1405) (17.7741, 22.4668) knots 0 0 0 1 2 2 2 projected
  line L18 (17.962, 37.4696) -> (17.3391, 37.4696) projected
  line L19 (17.3391, 37.4696) -> (17.3391, 39.8325) projected
  line L20 (17.3391, 39.8325) -> (17.962, 39.8325) projected
  line L21 (17.962, 39.8325) -> (17.962, 39.0564) projected
  line L22 (17.962, 39.0564) -> (22.8163, 39.0564) projected
  line L23 (22.8163, 39.0564) -> (22.8163, 39.8325) projected
  line L24 (22.8163, 39.8325) -> (23.4391, 39.8325) projected
  line L25 (23.4391, 39.8325) -> (23.4391, 37.4696) projected
  line L26 (23.4391, 37.4696) -> (22.8163, 37.4696) projected
  line L27 (22.8163, 37.4696) -> (22.8163, 38.2457) projected
  line L28 (22.8163, 38.2457) -> (17.962, 38.2457) projected
  line L29 (17.962, 38.2457) -> (17.962, 37.4696) projected
  spline S8 degree 2 poles (17.4083, 41.1623) (17.3194, 41.4292) (17.2304, 41.884) (17.2304, 42.2498) knots 0 0 0 1 2 2 2 projected
  spline S9 degree 2 poles (17.2304, 42.2498) (17.2304, 42.843) (17.6308, 43.8464) (18.0312, 44.2123) knots 0 0 0 1 2 2 2 projected
  spline S10 degree 2 poles (18.0312, 44.2123) (18.4267, 44.5781) (19.613, 44.9785) (20.3842, 44.9785) knots 0 0 0 1 2 2 2 projected
  spline S11 degree 2 poles (20.3842, 44.9785) (21.1504, 44.9785) (22.2874, 44.5879) (22.7075, 44.2172) knots 0 0 0 1 2 2 2 projected
  spline S12 degree 2 poles (22.7075, 44.2172) (23.1178, 43.8514) (23.5479, 42.8529) (23.5479, 42.2349) knots 0 0 0 1 2 2 2 projected
  spline S13 degree 2 poles (23.5479, 42.2349) (23.5479, 41.9285) (23.4589, 41.3896) (23.3897, 41.1623) knots 0 0 0 1 2 2 2 projected
  spline S14 degree 2 poles (23.3897, 41.1623) (23.3254, 40.9645) (23.1425, 40.5542) (23.0338, 40.3516) knots 0 0 0 1 2 2 2 projected
  line L30 (23.0338, 40.3516) -> (22.055, 40.3516) projected
  line L31 (22.055, 40.3516) -> (22.055, 40.4158) projected
  spline S15 degree 2 poles (22.055, 40.4158) (22.1539, 40.5246) (22.4307, 40.8607) (22.5642, 41.1029) knots 0 0 0 1 2 2 2 projected
  spline S16 degree 2 poles (22.5642, 41.1029) (22.6927, 41.3353) (22.8558, 41.884) (22.8558, 42.2399) knots 0 0 0 1 2 2 2 projected
  spline S17 degree 2 poles (22.8558, 42.2399) (22.8558, 42.6304) (22.5345, 43.3274) (22.228, 43.5894) knots 0 0 0 1 2 2 2 projected
  spline S18 degree 2 poles (22.228, 43.5894) (21.9166, 43.8464) (20.9724, 44.1332) (20.3842, 44.1332) knots 0 0 0 1 2 2 2 projected
  spline S19 degree 2 poles (20.3842, 44.1332) (19.7564, 44.1332) (18.8518, 43.8316) (18.5404, 43.5696) knots 0 0 0 1 2 2 2 projected
  spline S20 degree 2 poles (18.5404, 43.5696) (18.2388, 43.3126) (17.9323, 42.6255) (17.9323, 42.2399) knots 0 0 0 1 2 2 2 projected
  spline S21 degree 2 poles (17.9323, 42.2399) (17.9323, 41.8889) (18.1053, 41.2908) (18.2339, 41.0584) knots 0 0 0 1 2 2 2 projected
  spline S22 degree 2 poles (18.2339, 41.0584) (18.3624, 40.836) (18.6293, 40.5048) (18.7233, 40.4109) knots 0 0 0 1 2 2 2 projected
  line L32 (18.7233, 40.4109) -> (18.7233, 40.3516) projected
  line L33 (18.7233, 40.3516) -> (17.7544, 40.3516) projected
  spline S23 degree 2 poles (17.7544, 40.3516) (17.6604, 40.5542) (17.4874, 40.9101) (17.4083, 41.1623) knots 0 0 0 1 2 2 2 projected
  line L34 (19.9937, 33.9154) -> (17.3391, 31.7453) projected
  line L35 (17.3391, 31.7453) -> (17.3391, 32.7982) projected
  line L36 (17.3391, 32.7982) -> (19.7663, 34.7261) projected
  line L37 (19.7663, 34.7261) -> (19.7663, 35.6554) projected
  line L38 (19.7663, 35.6554) -> (17.3391, 35.6554) projected
  line L39 (17.3391, 35.6554) -> (17.3391, 36.4661) projected
  line L40 (17.3391, 36.4661) -> (23.4391, 36.4661) projected
  line L41 (23.4391, 36.4661) -> (23.4391, 34.8942) projected
  spline S24 degree 2 poles (23.4391, 34.8942) (23.4391, 34.3702) (23.3254, 33.6633) (23.1178, 33.342) knots 0 0 0 1 2 2 2 projected
  spline S25 degree 2 poles (23.1178, 33.342) (22.9102, 33.0207) (22.2626, 32.6499) (21.7831, 32.6499) knots 0 0 0 1 2 2 2 projected
  spline S26 degree 2 poles (21.7831, 32.6499) (21.1158, 32.6499) (20.2112, 33.3321) (19.9937, 33.9154) knots 0 0 0 1 2 2 2 projected
  spline S27 degree 2 poles (17.4083, 27.7907) (17.3194, 28.0576) (17.2304, 28.5124) (17.2304, 28.8782) knots 0 0 0 1 2 2 2 projected
  spline S28 degree 2 poles (17.2304, 28.8782) (17.2304, 29.4714) (17.6308, 30.4749) (18.0312, 30.8407) knots 0 0 0 1 2 2 2 projected
  spline S29 degree 2 poles (18.0312, 30.8407) (18.4267, 31.2065) (19.613, 31.6069) (20.3842, 31.6069) knots 0 0 0 1 2 2 2 projected
  spline S30 degree 2 poles (20.3842, 31.6069) (21.1504, 31.6069) (22.2874, 31.2164) (22.7075, 30.8456) knots 0 0 0 1 2 2 2 projected
  spline S31 degree 2 poles (22.7075, 30.8456) (23.1178, 30.4798) (23.5479, 29.4813) (23.5479, 28.8634) knots 0 0 0 1 2 2 2 projected
  spline S32 degree 2 poles (23.5479, 28.8634) (23.5479, 28.5569) (23.4589, 28.0181) (23.3897, 27.7907) knots 0 0 0 1 2 2 2 projected
  spline S33 degree 2 poles (23.3897, 27.7907) (23.3254, 27.593) (23.1425, 27.1827) (23.0338, 26.98) knots 0 0 0 1 2 2 2 projected
  line L42 (23.0338, 26.98) -> (22.055, 26.98) projected
  line L43 (22.055, 26.98) -> (22.055, 27.0443) projected
  spline S34 degree 2 poles (22.055, 27.0443) (22.1539, 27.153) (22.4307, 27.4892) (22.5642, 27.7314) knots 0 0 0 1 2 2 2 projected
  spline S35 degree 2 poles (22.5642, 27.7314) (22.6927, 27.9637) (22.8558, 28.5124) (22.8558, 28.8683) knots 0 0 0 1 2 2 2 projected
  spline S36 degree 2 poles (22.8558, 28.8683) (22.8558, 29.2588) (22.5345, 29.9558) (22.228, 30.2178) knots 0 0 0 1 2 2 2 projected
  spline S37 degree 2 poles (22.228, 30.2178) (21.9166, 30.4749) (20.9724, 30.7616) (20.3842, 30.7616) knots 0 0 0 1 2 2 2 projected
  spline S38 degree 2 poles (20.3842, 30.7616) (19.7564, 30.7616) (18.8518, 30.4601) (18.5404, 30.1981) knots 0 0 0 1 2 2 2 projected
  spline S39 degree 2 poles (18.5404, 30.1981) (18.2388, 29.941) (17.9323, 29.2539) (17.9323, 28.8683) knots 0 0 0 1 2 2 2 projected
  spline S40 degree 2 poles (17.9323, 28.8683) (17.9323, 28.5174) (18.1053, 27.9192) (18.2339, 27.6869) knots 0 0 0 1 2 2 2 projected
  spline S41 degree 2 poles (18.2339, 27.6869) (18.3624, 27.4644) (18.6293, 27.1332) (18.7233, 27.0393) knots 0 0 0 1 2 2 2 projected
  line L44 (18.7233, 27.0393) -> (18.7233, 26.98) projected
  line L45 (18.7233, 26.98) -> (17.7544, 26.98) projected
  spline S42 degree 2 poles (17.7544, 26.98) (17.6604, 27.1827) (17.4874, 27.5386) (17.4083, 27.7907) knots 0 0 0 1 2 2 2 projected
  line L46 (17.962, 18.5962) -> (17.3391, 18.5962) projected
  line L47 (17.3391, 18.5962) -> (17.3391, 20.9591) projected
  line L48 (17.3391, 20.9591) -> (17.962, 20.9591) projected
  line L49 (17.962, 20.9591) -> (17.962, 20.183) projected
  line L50 (17.962, 20.183) -> (22.8163, 20.183) projected
  line L51 (22.8163, 20.183) -> (22.8163, 20.9591) projected
  line L52 (22.8163, 20.9591) -> (23.4391, 20.9591) projected
  line L53 (23.4391, 20.9591) -> (23.4391, 18.5962) projected
  line L54 (23.4391, 18.5962) -> (22.8163, 18.5962) projected
  line L55 (22.8163, 18.5962) -> (22.8163, 19.3723) projected
  line L56 (22.8163, 19.3723) -> (17.962, 19.3723) projected
  line L57 (17.962, 19.3723) -> (17.962, 18.5962) projected
  circle A4 centre (41.6, 0) radius 1.4
  circle A5 centre (0, 0) radius 1.4
  circle A6 centre (0, 61.6) radius 1.4
  circle A7 centre (41.6, 61.6) radius 1.4
  point P0 (20.8, 30.8)
  dimension "d6" = 0.2
  dimension "d7" = 0.2
  dimension "d8" = 0.2
  dimension "d9" = 0.2
extrude "돌출4" add sketch "스케치4" along normal blind 6 contours A4 | A5 | A6 | A7
properties part number "head_box"
